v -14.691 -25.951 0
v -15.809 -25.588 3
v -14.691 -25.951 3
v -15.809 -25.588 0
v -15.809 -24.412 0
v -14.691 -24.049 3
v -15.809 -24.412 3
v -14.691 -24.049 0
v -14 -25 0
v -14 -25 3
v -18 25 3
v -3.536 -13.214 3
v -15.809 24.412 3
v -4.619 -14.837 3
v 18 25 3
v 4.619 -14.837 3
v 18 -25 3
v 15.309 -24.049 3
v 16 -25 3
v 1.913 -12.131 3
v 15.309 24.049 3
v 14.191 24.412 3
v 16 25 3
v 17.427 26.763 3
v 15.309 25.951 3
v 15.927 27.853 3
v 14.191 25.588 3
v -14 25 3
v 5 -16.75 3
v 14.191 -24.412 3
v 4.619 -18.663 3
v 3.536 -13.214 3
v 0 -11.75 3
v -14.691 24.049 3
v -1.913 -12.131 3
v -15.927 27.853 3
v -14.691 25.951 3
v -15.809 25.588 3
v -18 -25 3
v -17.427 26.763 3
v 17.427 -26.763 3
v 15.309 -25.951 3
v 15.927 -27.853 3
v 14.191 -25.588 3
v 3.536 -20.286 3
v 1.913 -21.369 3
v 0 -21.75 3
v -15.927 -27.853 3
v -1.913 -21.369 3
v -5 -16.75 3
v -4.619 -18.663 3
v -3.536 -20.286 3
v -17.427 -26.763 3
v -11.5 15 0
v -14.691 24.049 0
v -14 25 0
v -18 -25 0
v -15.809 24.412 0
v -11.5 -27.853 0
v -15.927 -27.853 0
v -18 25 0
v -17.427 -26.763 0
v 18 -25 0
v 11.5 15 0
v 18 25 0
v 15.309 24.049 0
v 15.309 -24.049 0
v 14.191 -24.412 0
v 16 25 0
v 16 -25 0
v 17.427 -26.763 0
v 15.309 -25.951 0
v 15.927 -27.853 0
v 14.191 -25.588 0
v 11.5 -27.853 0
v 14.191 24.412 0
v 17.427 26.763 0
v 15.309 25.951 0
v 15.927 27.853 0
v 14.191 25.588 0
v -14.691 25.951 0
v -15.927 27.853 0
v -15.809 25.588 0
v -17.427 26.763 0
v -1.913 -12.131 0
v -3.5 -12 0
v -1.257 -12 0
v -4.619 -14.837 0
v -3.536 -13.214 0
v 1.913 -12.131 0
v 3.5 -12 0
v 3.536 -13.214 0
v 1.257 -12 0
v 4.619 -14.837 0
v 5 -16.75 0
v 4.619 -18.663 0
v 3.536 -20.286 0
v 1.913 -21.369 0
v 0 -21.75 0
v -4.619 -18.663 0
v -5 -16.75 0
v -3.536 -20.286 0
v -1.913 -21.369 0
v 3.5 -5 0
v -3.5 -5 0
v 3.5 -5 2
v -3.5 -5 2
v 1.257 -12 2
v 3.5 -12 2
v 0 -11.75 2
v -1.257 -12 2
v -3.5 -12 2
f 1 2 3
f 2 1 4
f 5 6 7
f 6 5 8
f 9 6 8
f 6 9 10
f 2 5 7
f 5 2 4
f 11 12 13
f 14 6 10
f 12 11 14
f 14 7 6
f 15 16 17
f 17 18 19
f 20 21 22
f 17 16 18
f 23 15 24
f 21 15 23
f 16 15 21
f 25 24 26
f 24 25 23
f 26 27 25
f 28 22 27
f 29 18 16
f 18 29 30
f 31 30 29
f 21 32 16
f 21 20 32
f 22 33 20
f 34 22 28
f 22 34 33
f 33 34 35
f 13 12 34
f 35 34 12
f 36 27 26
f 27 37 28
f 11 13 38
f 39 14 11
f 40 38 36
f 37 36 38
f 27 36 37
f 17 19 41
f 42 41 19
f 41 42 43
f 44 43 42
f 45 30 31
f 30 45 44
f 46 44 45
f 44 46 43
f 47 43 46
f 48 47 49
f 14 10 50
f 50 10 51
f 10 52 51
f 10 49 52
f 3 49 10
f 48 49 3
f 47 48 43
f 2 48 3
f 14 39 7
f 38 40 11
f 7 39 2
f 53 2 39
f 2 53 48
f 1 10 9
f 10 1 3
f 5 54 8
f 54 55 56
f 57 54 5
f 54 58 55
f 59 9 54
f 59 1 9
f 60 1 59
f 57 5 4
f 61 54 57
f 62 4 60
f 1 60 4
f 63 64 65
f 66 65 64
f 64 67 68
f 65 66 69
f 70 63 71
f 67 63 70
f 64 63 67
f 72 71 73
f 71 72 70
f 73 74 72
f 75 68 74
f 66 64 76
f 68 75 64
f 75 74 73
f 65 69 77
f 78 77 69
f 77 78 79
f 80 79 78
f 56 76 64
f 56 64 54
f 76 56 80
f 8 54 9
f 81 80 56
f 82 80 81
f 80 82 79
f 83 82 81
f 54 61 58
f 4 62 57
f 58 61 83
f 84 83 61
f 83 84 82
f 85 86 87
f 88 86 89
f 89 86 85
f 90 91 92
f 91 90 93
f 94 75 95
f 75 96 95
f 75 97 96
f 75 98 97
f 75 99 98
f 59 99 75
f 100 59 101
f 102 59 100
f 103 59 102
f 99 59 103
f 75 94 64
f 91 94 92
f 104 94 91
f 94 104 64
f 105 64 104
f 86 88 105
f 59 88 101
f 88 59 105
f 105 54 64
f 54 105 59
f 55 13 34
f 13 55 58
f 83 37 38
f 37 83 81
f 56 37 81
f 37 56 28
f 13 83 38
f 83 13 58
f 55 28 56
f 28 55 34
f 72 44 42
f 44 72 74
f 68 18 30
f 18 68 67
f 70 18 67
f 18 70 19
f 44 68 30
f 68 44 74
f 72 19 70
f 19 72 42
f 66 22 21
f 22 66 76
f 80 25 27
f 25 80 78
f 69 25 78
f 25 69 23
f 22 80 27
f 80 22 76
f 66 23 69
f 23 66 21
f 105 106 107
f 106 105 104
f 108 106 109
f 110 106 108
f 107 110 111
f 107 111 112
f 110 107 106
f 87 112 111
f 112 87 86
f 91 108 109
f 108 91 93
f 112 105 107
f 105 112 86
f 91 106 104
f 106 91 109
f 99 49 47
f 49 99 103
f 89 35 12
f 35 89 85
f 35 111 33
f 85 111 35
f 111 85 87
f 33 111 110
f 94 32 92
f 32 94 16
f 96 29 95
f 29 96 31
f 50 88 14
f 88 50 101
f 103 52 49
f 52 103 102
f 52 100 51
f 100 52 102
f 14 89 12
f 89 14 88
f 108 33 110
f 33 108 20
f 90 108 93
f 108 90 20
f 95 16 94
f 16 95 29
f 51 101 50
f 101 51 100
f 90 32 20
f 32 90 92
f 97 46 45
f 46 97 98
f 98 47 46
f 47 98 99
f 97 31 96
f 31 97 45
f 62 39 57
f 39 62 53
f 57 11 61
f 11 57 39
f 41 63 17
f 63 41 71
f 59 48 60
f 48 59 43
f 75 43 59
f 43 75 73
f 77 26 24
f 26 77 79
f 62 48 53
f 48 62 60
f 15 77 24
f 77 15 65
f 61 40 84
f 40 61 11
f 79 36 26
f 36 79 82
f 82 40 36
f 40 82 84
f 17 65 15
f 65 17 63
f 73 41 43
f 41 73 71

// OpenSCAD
lid();


module lid(){
difference(){
hull(){
for(x=[-15,15]){
for(y=[-25,25]){
 translate([x,y,0]) cylinder(r=3,h=3);
}//end hull
}//end x loop
}//end y loop

for(x=[-15,15]){
for(y=[-25,25]){
//drill holes
 translate([x,y,0]) cylinder(r=1,h=3);
}//end x loop
}//end y loop
//cut out motor
translate([0,-6.5,-8]) rotate([0,0,90]) motor_cutout();
}//end diff
}//end part

module motor_cutout(){
union(){
cube([43,23,16],center=true);
translate([-2,0,1]) cube([7,7,18],center=true);
translate([-10.25,0,5]) cylinder(r=5,h=25,center=true);
}//end union

}
